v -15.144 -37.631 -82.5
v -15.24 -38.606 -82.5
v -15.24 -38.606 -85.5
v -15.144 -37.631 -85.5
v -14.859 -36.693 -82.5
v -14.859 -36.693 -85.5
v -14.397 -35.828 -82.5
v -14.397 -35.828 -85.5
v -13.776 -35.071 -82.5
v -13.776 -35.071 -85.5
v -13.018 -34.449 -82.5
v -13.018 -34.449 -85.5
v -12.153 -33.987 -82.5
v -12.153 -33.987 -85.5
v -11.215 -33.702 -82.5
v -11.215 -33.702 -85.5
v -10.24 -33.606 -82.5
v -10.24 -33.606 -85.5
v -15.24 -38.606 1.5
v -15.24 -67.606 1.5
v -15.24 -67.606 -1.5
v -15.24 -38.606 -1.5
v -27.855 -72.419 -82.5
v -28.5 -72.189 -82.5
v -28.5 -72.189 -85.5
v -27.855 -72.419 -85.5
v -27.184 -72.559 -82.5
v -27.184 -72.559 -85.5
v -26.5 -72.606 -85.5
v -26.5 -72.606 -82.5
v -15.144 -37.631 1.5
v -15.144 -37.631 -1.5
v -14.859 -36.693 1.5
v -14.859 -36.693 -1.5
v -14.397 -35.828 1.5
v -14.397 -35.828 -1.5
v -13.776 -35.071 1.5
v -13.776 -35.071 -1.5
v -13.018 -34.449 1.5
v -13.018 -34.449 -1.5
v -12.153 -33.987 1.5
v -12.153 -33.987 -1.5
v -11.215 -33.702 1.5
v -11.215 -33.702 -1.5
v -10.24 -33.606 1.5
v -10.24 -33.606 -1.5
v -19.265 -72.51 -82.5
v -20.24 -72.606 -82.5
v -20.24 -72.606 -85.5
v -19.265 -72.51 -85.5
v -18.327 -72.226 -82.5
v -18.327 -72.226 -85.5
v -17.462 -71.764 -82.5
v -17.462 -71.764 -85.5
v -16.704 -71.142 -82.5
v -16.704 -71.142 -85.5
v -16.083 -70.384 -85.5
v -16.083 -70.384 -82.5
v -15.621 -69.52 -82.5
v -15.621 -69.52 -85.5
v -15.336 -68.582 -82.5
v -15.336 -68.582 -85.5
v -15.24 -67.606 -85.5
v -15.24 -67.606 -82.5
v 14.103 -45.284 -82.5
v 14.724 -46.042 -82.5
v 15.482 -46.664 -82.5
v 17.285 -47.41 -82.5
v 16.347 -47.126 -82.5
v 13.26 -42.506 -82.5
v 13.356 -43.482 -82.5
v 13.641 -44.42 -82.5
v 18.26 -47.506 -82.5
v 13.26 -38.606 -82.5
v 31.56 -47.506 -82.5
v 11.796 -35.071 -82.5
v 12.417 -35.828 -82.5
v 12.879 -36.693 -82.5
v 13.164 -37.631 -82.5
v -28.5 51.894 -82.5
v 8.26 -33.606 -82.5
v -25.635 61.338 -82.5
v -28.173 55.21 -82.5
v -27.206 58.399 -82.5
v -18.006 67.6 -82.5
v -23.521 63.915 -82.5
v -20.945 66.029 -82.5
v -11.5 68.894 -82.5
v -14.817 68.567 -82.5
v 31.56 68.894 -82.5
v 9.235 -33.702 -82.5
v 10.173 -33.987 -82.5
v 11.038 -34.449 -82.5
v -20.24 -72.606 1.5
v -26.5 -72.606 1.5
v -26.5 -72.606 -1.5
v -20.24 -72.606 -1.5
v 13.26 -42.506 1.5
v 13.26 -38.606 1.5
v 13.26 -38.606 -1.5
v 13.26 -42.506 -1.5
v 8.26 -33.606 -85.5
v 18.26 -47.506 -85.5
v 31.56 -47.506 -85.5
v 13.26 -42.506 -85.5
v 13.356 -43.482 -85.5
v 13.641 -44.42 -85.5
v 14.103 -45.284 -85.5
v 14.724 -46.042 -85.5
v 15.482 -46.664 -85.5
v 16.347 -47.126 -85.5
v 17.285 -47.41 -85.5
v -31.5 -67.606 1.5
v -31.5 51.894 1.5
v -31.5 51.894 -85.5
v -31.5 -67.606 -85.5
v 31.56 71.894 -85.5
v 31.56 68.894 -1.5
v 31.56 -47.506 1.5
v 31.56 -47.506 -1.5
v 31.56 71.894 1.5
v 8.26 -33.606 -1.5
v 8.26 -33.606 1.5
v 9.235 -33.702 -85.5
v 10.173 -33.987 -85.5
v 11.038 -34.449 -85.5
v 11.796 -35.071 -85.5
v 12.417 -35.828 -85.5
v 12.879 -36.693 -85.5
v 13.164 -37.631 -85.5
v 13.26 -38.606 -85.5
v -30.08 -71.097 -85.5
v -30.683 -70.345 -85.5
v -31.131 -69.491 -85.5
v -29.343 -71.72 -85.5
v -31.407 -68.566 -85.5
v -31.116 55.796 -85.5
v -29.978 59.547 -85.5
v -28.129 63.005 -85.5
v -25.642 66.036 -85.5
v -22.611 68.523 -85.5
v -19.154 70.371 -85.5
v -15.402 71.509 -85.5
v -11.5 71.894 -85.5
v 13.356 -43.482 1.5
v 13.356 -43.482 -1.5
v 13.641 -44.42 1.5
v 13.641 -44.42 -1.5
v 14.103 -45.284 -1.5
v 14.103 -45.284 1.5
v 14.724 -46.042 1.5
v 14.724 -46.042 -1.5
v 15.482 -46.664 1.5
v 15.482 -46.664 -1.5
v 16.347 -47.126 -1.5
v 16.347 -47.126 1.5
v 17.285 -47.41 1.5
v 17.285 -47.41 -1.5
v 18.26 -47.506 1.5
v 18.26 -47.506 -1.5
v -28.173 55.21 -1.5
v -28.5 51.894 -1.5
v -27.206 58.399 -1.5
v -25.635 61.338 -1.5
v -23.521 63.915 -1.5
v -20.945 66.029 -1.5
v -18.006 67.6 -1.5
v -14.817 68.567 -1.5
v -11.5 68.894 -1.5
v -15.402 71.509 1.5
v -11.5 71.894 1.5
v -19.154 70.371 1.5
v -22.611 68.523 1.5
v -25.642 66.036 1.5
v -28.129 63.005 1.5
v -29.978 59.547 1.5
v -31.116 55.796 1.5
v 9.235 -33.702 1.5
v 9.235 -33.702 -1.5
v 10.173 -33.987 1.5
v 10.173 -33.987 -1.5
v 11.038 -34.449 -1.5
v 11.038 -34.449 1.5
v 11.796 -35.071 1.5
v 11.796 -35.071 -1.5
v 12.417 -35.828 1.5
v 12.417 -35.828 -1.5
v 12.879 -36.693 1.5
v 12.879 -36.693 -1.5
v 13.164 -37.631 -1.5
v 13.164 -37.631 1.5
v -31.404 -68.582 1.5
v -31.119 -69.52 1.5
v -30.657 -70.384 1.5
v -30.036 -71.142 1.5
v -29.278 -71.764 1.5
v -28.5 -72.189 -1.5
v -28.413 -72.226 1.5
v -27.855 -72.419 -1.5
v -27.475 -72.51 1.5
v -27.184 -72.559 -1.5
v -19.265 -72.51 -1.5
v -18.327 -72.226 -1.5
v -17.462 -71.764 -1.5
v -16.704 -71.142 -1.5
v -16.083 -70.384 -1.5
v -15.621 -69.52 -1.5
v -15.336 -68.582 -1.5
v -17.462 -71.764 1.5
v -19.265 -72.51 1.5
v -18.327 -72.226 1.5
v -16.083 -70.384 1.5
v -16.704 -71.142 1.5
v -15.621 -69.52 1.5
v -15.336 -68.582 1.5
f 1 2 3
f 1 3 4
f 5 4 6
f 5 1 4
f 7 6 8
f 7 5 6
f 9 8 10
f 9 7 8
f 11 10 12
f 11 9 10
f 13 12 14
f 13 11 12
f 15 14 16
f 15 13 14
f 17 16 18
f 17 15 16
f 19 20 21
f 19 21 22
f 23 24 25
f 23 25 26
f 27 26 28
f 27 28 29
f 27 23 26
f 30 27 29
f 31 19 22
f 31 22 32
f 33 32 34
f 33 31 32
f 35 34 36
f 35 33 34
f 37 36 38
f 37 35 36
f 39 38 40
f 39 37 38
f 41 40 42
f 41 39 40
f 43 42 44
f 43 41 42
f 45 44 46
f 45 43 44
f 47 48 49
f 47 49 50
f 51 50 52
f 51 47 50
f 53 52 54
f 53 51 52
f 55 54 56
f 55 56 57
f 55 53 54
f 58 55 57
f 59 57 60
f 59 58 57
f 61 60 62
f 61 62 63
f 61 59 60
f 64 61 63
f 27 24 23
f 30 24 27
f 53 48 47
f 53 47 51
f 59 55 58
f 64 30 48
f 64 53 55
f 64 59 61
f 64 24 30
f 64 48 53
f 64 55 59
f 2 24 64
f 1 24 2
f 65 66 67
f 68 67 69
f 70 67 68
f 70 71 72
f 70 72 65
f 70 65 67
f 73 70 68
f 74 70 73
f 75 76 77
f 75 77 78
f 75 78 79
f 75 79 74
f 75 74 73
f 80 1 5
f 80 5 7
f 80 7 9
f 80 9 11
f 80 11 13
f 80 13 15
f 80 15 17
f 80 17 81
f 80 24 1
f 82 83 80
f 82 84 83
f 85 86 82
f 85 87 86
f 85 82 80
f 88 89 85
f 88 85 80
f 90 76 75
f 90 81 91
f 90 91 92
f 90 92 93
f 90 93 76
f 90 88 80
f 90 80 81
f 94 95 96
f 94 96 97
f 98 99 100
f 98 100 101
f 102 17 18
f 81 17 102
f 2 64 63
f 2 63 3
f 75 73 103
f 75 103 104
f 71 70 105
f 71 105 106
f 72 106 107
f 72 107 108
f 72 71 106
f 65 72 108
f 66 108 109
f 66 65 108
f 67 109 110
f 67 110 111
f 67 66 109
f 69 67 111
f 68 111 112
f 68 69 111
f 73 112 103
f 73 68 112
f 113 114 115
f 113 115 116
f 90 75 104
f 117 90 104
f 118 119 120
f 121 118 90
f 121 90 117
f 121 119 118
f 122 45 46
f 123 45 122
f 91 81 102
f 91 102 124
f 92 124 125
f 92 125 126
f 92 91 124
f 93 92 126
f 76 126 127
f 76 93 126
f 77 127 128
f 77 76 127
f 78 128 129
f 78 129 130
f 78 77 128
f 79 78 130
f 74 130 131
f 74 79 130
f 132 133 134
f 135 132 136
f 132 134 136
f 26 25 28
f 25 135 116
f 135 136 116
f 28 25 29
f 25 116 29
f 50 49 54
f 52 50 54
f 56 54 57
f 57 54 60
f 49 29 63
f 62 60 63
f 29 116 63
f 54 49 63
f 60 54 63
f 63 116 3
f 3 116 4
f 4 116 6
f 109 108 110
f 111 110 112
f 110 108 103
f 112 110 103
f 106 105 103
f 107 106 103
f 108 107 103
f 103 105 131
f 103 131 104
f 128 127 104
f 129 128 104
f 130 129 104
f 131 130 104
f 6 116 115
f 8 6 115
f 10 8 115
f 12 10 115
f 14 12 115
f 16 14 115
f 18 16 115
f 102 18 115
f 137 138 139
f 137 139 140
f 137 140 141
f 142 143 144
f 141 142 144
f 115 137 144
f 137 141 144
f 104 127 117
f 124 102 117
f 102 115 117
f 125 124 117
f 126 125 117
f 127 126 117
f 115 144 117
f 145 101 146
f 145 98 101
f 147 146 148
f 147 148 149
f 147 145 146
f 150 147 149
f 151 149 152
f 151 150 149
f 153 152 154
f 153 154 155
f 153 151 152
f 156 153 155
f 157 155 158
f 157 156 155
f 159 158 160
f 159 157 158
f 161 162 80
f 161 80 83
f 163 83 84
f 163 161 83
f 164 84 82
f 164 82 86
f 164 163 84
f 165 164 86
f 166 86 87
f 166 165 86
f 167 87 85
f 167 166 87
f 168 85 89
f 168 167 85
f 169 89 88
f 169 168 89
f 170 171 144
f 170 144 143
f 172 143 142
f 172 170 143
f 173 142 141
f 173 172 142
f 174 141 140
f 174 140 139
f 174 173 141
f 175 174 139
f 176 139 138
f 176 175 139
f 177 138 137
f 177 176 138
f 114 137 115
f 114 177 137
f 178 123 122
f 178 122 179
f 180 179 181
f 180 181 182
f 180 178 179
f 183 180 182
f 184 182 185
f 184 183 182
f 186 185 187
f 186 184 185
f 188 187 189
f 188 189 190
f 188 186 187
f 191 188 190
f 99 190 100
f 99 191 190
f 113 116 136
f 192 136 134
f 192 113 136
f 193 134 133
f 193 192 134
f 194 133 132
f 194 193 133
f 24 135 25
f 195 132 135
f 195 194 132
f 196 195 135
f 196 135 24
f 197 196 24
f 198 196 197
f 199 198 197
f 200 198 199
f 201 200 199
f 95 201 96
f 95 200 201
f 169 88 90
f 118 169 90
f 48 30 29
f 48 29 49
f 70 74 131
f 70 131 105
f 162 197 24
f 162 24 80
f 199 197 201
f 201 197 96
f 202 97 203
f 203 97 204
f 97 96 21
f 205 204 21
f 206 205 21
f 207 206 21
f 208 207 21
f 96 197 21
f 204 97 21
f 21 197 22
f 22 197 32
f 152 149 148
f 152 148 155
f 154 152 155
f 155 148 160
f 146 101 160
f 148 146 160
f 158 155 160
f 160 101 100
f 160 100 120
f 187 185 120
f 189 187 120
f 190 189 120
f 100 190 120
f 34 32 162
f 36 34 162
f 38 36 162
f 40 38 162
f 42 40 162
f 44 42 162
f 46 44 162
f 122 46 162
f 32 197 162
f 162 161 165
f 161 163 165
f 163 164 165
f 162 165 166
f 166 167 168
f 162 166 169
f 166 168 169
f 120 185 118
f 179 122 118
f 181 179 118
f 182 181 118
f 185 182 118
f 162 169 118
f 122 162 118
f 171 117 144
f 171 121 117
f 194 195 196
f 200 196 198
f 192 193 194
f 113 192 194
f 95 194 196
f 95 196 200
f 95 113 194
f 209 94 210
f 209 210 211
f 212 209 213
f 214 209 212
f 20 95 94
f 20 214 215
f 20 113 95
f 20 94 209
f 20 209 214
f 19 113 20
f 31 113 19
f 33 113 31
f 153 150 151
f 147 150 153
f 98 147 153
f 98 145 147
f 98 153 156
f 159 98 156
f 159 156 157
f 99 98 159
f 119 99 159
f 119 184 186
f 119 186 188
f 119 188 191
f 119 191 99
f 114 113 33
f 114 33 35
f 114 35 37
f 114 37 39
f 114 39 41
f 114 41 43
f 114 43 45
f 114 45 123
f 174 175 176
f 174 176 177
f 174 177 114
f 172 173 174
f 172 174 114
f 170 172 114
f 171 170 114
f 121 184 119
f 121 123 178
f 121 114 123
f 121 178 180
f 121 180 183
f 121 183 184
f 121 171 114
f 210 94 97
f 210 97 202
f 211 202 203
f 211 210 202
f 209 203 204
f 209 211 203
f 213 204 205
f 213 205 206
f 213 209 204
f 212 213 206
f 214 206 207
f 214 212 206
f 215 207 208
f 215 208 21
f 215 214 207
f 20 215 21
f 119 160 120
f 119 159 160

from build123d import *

# Parameters (mm, degrees)
BOSS_EXTRUDE1_DEPTH = 1.5
BOSS_EXTRUDE2_DEPTH = 81
BOSS_EXTRUDE3_DEPTH = 3


with BuildPart() as part:
    # Sketch1 → Boss-Extrude1 (new, symmetric)
    with BuildSketch(Plane.XY):
        with BuildLine():
            Line((31.56, -47.50625778), (31.56, 71.89374222))
            Line((31.56, 71.89374222), (-11.5, 71.89374222))
            ThreePointArc((-11.5, 71.89374222), (-25.642135624, 66.035877844), (-31.5, 51.89374222))
            Line((-31.5, 51.89374222), (-31.5, -67.60625778))
            ThreePointArc((-31.5, -67.60625778), (-30.035533906, -71.141791686), (-26.5, -72.60625778))
            Line((-26.5, -72.60625778), (-20.24, -72.60625778))
            ThreePointArc((-20.24, -72.60625778), (-16.704466094, -71.141791686), (-15.24, -67.60625778))
            Line((-15.24, -67.60625778), (-15.24, -38.60625778))
            ThreePointArc((-15.24, -38.60625778), (-13.775533906, -35.070723874), (-10.24, -33.60625778))
            Line((-10.24, -33.60625778), (8.26, -33.60625778))
            ThreePointArc((8.26, -33.60625778), (11.795533906, -35.070723874), (13.26, -38.60625778))
            Line((13.26, -38.60625778), (13.26, -42.50625778))
            ThreePointArc((13.26, -42.50625778), (14.724466094, -46.041791686), (18.26, -47.50625778))
            Line((18.26, -47.50625778), (31.56, -47.50625778))
        make_face()
    extrude(amount=BOSS_EXTRUDE1_DEPTH, both=True)

    # Sketch2 → Boss-Extrude2 (add)
    with BuildSketch(Plane(origin=(0, 0, -1.5), x_dir=(-1, 0, 0), z_dir=(0, 0, -1))):
        with BuildLine():
            Line((28.5, -67.60625778), (28.5, 51.89374222))
            ThreePointArc((28.5, 51.89374222), (23.52081528, 63.9145575), (11.5, 68.89374222))
            Line((11.5, 68.89374222), (-28.56, 68.89374222))
            Line((-28.56, 68.89374222), (-31.56, 68.89374222))
            Line((-31.56, 68.89374222), (-31.56, 71.89374222))
            Line((-31.56, 71.89374222), (11.5, 71.89374222))
            ThreePointArc((11.5, 71.89374222), (25.642135624, 66.035877844), (31.5, 51.89374222))
            Line((31.5, 51.89374222), (31.5, -67.60625778))
            ThreePointArc((31.5, -67.60625778), (30.683300133, -70.344870568), (28.5, -72.188833475))
            Line((28.5, -72.188833475), (28.5, -67.60625778))
        make_face()
    extrude(amount=BOSS_EXTRUDE2_DEPTH)

    # Sketch3 → Boss-Extrude3 (add)
    with BuildSketch(Plane(origin=(0, 0, -82.5), x_dir=(-1, 0, 0), z_dir=(0, 0, -1))):
        with BuildLine():
            Line((-31.56, 68.89374222), (-31.56, 71.89374222))
            Line((-31.56, 71.89374222), (11.5, 71.89374222))
            ThreePointArc((11.5, 71.89374222), (25.642135624, 66.035877844), (31.5, 51.89374222))
            Line((31.5, 51.89374222), (31.5, -67.60625778))
            ThreePointArc((31.5, -67.60625778), (30.683300133, -70.344870568), (28.5, -72.188833475))
            ThreePointArc((28.5, -72.188833475), (27.521548218, -72.500789345), (26.5, -72.60625778))
            Line((26.5, -72.60625778), (20.24, -72.60625778))
            ThreePointArc((20.24, -72.60625778), (16.704466094, -71.141791686), (15.24, -67.60625778))
            Line((15.24, -67.60625778), (15.24, -38.60625778))
            ThreePointArc((15.24, -38.60625778), (13.775533906, -35.070723874), (10.24, -33.60625778))
            Line((10.24, -33.60625778), (-8.26, -33.60625778))
            ThreePointArc((-8.26, -33.60625778), (-11.795533906, -35.070723874), (-13.26, -38.60625778))
            Line((-13.26, -38.60625778), (-13.26, -42.50625778))
            ThreePointArc((-13.26, -42.50625778), (-14.724466094, -46.041791686), (-18.26, -47.50625778))
            Line((-18.26, -47.50625778), (-31.56, -47.50625778))
            Line((-31.56, -47.50625778), (-31.56, 68.89374222))
        make_face()
    extrude(amount=BOSS_EXTRUDE3_DEPTH)


solid = part.part
